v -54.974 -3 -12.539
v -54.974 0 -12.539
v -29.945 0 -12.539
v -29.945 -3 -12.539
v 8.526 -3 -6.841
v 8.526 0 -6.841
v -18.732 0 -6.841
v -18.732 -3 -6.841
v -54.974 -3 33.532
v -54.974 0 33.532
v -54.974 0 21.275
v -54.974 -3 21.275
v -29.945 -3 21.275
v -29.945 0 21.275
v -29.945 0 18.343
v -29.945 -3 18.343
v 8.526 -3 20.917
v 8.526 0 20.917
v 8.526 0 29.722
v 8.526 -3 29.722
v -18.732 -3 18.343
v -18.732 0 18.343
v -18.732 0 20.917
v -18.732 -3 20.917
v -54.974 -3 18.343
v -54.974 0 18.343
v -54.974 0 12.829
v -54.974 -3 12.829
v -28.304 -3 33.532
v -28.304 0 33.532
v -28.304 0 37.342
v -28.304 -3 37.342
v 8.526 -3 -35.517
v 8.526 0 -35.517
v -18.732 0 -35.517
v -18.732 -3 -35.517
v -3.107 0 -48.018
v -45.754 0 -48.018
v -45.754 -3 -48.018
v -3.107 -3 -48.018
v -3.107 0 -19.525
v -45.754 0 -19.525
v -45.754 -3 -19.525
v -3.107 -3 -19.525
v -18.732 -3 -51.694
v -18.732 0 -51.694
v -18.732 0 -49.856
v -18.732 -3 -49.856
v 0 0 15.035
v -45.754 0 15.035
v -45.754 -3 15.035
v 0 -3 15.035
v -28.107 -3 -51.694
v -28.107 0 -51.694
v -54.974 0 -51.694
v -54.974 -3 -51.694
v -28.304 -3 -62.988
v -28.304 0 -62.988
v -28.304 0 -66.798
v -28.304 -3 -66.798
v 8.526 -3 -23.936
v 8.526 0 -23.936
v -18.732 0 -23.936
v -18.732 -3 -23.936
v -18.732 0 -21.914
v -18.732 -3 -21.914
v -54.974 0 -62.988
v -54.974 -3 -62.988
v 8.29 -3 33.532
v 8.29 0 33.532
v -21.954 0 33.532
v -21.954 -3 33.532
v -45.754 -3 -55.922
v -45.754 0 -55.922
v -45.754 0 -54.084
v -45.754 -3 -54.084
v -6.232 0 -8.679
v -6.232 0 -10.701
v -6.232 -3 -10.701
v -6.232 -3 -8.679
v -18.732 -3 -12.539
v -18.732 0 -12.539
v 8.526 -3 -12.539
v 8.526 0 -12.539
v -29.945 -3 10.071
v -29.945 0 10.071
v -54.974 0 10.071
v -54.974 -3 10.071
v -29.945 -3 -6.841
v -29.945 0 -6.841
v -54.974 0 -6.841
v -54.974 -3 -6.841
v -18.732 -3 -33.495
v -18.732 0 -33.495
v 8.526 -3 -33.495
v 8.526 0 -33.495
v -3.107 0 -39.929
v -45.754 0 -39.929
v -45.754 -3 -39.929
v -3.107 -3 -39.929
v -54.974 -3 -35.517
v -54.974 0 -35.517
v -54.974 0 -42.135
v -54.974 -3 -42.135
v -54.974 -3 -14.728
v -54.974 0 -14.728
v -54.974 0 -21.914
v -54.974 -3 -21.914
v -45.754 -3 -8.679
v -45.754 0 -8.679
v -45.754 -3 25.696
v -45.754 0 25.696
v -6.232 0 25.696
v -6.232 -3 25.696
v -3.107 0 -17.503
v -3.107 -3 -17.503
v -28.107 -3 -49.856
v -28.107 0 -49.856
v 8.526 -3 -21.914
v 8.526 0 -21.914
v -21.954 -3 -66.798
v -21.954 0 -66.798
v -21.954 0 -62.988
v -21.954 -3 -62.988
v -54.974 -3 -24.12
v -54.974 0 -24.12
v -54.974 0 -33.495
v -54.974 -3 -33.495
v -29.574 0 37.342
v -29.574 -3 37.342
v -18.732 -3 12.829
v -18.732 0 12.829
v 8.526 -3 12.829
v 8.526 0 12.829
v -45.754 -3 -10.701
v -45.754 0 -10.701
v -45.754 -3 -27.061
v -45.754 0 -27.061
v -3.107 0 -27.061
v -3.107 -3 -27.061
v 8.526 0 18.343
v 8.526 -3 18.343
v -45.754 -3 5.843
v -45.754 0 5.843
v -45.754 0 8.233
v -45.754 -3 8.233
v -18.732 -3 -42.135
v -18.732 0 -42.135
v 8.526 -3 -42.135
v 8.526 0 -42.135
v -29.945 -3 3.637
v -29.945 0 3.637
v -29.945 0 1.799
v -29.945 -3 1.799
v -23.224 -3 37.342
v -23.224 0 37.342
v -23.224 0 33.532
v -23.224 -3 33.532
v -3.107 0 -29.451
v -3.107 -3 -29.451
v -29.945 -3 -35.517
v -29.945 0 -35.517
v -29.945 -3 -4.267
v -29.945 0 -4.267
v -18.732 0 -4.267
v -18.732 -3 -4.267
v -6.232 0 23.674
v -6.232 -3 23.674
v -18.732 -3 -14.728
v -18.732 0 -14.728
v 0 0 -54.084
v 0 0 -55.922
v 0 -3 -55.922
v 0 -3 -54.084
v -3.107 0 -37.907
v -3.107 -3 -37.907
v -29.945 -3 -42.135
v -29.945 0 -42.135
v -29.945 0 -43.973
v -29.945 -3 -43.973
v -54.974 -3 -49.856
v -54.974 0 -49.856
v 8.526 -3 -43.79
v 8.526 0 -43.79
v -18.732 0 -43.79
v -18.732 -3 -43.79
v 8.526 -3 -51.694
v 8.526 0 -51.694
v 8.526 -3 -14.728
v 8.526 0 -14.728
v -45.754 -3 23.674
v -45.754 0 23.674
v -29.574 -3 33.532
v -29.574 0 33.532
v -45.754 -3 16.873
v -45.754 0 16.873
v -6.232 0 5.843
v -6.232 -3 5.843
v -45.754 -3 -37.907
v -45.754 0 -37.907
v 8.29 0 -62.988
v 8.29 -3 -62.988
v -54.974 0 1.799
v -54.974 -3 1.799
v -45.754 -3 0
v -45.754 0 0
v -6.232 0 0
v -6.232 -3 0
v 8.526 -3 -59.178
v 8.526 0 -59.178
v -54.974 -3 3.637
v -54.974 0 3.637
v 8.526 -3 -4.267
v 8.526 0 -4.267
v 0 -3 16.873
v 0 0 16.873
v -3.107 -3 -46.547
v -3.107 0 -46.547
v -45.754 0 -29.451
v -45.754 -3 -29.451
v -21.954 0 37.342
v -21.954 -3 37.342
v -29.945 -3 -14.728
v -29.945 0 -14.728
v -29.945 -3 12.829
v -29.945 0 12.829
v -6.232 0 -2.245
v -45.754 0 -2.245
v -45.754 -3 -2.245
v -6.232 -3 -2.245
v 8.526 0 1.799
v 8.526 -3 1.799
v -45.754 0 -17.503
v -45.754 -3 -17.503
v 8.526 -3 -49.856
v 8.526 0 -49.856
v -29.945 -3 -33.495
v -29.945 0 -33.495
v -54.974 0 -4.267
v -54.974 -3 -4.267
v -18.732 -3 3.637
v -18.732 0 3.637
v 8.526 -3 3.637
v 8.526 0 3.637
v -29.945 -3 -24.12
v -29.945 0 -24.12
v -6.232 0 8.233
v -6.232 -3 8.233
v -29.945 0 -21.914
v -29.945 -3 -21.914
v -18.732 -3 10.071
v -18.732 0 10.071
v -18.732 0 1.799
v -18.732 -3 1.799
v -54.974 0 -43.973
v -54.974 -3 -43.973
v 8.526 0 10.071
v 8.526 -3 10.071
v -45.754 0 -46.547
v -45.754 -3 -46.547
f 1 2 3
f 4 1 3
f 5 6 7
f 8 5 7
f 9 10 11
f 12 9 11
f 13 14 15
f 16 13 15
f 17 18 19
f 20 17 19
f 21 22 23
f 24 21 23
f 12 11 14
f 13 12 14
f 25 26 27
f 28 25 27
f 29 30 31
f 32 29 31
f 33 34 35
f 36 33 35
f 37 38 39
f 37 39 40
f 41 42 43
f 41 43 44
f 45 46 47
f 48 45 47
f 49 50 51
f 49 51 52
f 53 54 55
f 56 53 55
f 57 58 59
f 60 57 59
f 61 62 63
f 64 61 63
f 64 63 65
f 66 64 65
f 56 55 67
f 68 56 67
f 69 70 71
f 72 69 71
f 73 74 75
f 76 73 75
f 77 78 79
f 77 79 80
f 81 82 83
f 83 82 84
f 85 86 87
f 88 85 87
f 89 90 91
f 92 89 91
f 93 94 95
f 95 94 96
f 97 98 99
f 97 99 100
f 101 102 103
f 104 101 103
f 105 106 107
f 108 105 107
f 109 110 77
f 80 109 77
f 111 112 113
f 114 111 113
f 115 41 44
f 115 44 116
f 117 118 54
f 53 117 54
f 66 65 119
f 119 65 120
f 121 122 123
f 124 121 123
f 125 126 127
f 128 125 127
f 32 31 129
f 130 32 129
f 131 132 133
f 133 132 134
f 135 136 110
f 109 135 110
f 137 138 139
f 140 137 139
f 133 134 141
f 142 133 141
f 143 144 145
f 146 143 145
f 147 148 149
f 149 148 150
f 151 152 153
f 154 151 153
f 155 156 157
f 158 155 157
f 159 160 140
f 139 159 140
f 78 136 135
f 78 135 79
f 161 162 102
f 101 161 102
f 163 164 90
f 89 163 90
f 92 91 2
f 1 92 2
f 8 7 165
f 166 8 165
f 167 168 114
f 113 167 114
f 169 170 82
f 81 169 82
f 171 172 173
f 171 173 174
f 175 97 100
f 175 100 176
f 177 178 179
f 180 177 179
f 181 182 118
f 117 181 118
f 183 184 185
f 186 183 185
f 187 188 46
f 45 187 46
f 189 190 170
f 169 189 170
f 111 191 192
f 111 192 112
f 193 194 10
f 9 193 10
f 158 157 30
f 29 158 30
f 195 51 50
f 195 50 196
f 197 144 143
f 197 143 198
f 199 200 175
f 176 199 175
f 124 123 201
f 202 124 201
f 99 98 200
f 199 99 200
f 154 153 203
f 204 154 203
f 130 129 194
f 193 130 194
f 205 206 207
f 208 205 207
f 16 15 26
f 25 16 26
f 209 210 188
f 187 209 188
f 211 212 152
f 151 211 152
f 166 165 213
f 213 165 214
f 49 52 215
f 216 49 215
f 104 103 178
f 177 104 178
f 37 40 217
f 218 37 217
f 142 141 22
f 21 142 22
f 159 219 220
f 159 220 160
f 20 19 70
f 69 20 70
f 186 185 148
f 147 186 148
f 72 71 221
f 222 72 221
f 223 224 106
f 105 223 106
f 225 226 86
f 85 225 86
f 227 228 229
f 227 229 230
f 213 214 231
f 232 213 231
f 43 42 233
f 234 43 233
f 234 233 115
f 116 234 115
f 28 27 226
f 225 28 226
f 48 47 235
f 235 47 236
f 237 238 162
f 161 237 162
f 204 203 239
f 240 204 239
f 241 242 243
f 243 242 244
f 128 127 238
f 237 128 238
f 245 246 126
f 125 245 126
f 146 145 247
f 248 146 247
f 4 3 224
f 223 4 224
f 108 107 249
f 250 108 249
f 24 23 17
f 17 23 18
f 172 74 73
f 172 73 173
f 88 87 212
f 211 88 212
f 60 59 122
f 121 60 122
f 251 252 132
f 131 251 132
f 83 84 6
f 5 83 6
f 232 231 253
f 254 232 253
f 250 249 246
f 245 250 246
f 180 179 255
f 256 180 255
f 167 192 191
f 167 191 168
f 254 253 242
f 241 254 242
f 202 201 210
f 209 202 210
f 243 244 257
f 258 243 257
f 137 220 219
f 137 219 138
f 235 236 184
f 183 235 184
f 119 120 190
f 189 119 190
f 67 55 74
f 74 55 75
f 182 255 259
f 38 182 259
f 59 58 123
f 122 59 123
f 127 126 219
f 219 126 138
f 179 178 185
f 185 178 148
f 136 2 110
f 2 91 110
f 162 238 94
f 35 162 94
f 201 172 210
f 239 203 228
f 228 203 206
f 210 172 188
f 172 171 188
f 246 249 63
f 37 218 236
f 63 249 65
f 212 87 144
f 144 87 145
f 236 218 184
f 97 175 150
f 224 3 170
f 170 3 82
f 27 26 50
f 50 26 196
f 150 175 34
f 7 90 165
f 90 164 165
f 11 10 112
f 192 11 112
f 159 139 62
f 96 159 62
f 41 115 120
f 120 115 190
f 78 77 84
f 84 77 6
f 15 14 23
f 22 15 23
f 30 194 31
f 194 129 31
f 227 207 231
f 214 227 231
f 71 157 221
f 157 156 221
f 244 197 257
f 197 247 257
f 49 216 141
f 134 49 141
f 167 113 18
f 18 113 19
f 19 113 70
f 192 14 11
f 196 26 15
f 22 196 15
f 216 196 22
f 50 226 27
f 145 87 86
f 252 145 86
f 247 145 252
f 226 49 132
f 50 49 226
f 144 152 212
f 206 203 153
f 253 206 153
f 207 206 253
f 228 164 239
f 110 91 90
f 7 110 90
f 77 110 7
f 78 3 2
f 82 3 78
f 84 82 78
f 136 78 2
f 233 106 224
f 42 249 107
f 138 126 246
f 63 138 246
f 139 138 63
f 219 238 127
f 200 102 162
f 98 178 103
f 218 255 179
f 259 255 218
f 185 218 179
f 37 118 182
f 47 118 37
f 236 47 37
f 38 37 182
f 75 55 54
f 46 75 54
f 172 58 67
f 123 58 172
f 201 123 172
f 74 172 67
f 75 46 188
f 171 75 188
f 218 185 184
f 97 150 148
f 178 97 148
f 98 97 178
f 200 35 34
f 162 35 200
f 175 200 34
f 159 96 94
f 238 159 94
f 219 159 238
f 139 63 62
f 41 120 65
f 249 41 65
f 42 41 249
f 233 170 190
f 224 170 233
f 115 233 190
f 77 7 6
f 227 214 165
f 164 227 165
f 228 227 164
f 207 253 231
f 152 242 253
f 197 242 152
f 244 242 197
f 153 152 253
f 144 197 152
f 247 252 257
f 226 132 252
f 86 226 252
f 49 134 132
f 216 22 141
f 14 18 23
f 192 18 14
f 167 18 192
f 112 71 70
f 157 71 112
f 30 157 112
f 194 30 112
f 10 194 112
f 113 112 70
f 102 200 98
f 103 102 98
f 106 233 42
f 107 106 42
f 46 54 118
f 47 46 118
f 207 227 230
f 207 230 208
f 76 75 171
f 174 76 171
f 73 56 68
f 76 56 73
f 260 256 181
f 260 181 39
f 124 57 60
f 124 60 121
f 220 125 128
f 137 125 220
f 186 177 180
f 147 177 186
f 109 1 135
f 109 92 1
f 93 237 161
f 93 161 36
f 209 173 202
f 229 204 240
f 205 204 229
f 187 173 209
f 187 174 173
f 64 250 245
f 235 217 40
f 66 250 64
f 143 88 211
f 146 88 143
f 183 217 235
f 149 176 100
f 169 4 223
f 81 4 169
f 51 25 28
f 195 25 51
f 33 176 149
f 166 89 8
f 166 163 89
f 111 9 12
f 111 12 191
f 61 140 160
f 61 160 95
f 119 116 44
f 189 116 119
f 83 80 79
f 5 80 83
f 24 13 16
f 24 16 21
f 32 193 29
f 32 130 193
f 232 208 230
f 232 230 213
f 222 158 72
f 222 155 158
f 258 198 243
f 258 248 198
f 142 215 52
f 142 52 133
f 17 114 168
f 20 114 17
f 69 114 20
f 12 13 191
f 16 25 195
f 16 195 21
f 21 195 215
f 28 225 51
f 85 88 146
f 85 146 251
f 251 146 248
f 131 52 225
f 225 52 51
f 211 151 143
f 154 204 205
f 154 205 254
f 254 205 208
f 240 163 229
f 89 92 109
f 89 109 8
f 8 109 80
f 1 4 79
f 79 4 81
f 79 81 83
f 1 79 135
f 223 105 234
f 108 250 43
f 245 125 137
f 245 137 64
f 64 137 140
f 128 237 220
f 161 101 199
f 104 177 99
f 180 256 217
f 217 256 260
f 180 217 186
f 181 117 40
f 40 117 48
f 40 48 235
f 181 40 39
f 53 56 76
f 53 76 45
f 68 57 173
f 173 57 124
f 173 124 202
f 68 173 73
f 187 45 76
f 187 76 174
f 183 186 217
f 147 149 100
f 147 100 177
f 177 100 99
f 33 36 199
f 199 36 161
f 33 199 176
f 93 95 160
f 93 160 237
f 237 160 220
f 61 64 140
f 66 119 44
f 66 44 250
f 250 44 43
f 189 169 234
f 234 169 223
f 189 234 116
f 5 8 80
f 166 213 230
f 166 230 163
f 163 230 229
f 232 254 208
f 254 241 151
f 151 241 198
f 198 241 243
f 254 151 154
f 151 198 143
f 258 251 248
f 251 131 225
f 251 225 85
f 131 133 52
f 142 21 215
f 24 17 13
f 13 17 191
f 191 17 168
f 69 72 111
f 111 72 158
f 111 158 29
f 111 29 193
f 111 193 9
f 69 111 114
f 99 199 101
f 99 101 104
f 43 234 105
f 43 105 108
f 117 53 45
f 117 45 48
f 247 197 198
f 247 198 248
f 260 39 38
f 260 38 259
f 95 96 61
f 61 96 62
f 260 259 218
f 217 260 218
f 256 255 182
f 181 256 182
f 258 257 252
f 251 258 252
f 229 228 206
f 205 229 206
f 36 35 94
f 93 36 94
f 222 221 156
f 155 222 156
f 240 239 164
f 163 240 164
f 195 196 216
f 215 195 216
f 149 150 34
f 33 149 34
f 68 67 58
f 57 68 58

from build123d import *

# Parameters (mm, degrees)
F0_W     = 42.64751
F0_H     = 1.470603
F0_H_2   = 2.02208
F0_H_3   = 2.389731
F0_W_2   = 45.754235
F0_H_4   = 1.838255
F0_W_3   = 39.522478
F0_H_5   = 2.245025
F0_H_6   = 2.022082
F0_H_7   = 1.838256
F1_DEPTH = 3


with BuildPart() as f1:
    # F0 (on Front) → F1 (new body)
    with BuildSketch(Plane.XZ):
        Polygon((-54.974343, 33.532223), (-54.974343, 29.722223), (8.525657, 29.722223), (8.290456, 33.532223), (-21.954343, 33.532223), (-21.954343, 37.342223), (-23.224343, 37.342223), (-23.224343, 33.532223), (-28.304343, 33.532223), (-28.304343, 37.342223), (-29.574343, 37.342223), (-29.574343, 33.532223), align=None)
        Polygon((8.525657, 29.722223), (-54.974343, 29.722223), (-54.974343, 21.275444), (-29.945243, 21.275444), (-29.945243, 18.343428), (-54.974343, 18.343428), (-54.974343, 12.828665), (-29.945243, 12.828665), (-29.945243, 10.071282), (-54.974343, 10.071282), (-54.974343, 3.63739), (-29.945243, 3.63739), (-29.945243, 1.799135), (-54.974343, 1.799135), (-54.974343, -4.267105), (-29.945243, -4.267105), (-29.945243, -6.840662), (-54.974343, -6.840662), (-54.974343, -12.539252), (-29.945243, -12.539252), (-29.945243, -14.727777), (-54.974343, -14.727777), (-54.974343, -21.91435), (-29.945243, -21.91435), (-29.945243, -24.120256), (-54.974343, -24.120256), (-54.974343, -33.495355), (-29.945243, -33.495355), (-29.945243, -35.517436), (-54.974343, -35.517436), (-54.974343, -42.135153), (-29.945243, -42.135153), (-29.945243, -43.973409), (-54.974343, -43.973409), (-54.974343, -49.855825), (-28.106989, -49.855825), (-28.106989, -51.694077), (-54.974343, -51.694077), (-54.974343, -59.177777), (8.525657, -59.177777), (8.525657, -51.694077), (-18.73189, -51.694077), (-18.73189, -49.855825), (8.525657, -49.855825), (8.525657, -43.789584), (-18.73189, -43.789584), (-18.73189, -42.135153), (8.525657, -42.135153), (8.525657, -35.517436), (-18.73189, -35.517436), (-18.73189, -33.495355), (8.525657, -33.495355), (8.525657, -23.936432), (-18.73189, -23.936432), (-18.73189, -21.91435), (8.525657, -21.91435), (8.525657, -14.727777), (-18.73189, -14.727777), (-18.73189, -12.539252), (8.525657, -12.539252), (8.525657, -6.840662), (-18.73189, -6.840662), (-18.73189, -4.267105), (8.525657, -4.267105), (8.525657, 1.799135), (-18.73189, 1.799135), (-18.73189, 3.63739), (8.525657, 3.63739), (8.525657, 10.071282), (-18.73189, 10.071282), (-18.73189, 12.828665), (8.525657, 12.828665), (8.525657, 18.343428), (-18.73189, 18.343428), (-18.73189, 20.916985), (8.525657, 20.916985), align=None)
        with Locations((-24.43048, -47.282267)):
            Rectangle(F0_W, F0_H, mode=Mode.SUBTRACT)
        with Locations((-24.43048, -38.918208)):
            Rectangle(F0_W, F0_H_2, mode=Mode.SUBTRACT)
        with Locations((-24.43048, -28.256329)):
            Rectangle(F0_W, F0_H_3, mode=Mode.SUBTRACT)
        with Locations((-24.43048, -18.513579)):
            Rectangle(F0_W, F0_H_2, mode=Mode.SUBTRACT)
        with Locations((-22.877118, -55.002933)):
            Rectangle(F0_W_2, F0_H_4, mode=Mode.SUBTRACT)
        with Locations((-25.992996, -9.689957)):
            Rectangle(F0_W_3, F0_H_2, mode=Mode.SUBTRACT)
        with Locations((-25.992996, -1.122513)):
            Rectangle(F0_W_3, F0_H_5, mode=Mode.SUBTRACT)
        with Locations((-25.992996, 7.038161)):
            Rectangle(F0_W_3, F0_H_3, mode=Mode.SUBTRACT)
        with Locations((-25.992996, 24.685406)):
            Rectangle(F0_W_3, F0_H_6, mode=Mode.SUBTRACT)
        with Locations((-22.877118, 15.953697)):
            Rectangle(F0_W_2, F0_H_7, mode=Mode.SUBTRACT)
        Polygon((8.525657, -59.177777), (-54.974343, -59.177777), (-54.974343, -62.987777), (-28.304343, -62.987777), (-28.304343, -66.797777), (-21.954343, -66.797777), (-21.954343, -62.987777), (8.290456, -62.987777), align=None)
    extrude(amount=F1_DEPTH)


solid = f1.part
